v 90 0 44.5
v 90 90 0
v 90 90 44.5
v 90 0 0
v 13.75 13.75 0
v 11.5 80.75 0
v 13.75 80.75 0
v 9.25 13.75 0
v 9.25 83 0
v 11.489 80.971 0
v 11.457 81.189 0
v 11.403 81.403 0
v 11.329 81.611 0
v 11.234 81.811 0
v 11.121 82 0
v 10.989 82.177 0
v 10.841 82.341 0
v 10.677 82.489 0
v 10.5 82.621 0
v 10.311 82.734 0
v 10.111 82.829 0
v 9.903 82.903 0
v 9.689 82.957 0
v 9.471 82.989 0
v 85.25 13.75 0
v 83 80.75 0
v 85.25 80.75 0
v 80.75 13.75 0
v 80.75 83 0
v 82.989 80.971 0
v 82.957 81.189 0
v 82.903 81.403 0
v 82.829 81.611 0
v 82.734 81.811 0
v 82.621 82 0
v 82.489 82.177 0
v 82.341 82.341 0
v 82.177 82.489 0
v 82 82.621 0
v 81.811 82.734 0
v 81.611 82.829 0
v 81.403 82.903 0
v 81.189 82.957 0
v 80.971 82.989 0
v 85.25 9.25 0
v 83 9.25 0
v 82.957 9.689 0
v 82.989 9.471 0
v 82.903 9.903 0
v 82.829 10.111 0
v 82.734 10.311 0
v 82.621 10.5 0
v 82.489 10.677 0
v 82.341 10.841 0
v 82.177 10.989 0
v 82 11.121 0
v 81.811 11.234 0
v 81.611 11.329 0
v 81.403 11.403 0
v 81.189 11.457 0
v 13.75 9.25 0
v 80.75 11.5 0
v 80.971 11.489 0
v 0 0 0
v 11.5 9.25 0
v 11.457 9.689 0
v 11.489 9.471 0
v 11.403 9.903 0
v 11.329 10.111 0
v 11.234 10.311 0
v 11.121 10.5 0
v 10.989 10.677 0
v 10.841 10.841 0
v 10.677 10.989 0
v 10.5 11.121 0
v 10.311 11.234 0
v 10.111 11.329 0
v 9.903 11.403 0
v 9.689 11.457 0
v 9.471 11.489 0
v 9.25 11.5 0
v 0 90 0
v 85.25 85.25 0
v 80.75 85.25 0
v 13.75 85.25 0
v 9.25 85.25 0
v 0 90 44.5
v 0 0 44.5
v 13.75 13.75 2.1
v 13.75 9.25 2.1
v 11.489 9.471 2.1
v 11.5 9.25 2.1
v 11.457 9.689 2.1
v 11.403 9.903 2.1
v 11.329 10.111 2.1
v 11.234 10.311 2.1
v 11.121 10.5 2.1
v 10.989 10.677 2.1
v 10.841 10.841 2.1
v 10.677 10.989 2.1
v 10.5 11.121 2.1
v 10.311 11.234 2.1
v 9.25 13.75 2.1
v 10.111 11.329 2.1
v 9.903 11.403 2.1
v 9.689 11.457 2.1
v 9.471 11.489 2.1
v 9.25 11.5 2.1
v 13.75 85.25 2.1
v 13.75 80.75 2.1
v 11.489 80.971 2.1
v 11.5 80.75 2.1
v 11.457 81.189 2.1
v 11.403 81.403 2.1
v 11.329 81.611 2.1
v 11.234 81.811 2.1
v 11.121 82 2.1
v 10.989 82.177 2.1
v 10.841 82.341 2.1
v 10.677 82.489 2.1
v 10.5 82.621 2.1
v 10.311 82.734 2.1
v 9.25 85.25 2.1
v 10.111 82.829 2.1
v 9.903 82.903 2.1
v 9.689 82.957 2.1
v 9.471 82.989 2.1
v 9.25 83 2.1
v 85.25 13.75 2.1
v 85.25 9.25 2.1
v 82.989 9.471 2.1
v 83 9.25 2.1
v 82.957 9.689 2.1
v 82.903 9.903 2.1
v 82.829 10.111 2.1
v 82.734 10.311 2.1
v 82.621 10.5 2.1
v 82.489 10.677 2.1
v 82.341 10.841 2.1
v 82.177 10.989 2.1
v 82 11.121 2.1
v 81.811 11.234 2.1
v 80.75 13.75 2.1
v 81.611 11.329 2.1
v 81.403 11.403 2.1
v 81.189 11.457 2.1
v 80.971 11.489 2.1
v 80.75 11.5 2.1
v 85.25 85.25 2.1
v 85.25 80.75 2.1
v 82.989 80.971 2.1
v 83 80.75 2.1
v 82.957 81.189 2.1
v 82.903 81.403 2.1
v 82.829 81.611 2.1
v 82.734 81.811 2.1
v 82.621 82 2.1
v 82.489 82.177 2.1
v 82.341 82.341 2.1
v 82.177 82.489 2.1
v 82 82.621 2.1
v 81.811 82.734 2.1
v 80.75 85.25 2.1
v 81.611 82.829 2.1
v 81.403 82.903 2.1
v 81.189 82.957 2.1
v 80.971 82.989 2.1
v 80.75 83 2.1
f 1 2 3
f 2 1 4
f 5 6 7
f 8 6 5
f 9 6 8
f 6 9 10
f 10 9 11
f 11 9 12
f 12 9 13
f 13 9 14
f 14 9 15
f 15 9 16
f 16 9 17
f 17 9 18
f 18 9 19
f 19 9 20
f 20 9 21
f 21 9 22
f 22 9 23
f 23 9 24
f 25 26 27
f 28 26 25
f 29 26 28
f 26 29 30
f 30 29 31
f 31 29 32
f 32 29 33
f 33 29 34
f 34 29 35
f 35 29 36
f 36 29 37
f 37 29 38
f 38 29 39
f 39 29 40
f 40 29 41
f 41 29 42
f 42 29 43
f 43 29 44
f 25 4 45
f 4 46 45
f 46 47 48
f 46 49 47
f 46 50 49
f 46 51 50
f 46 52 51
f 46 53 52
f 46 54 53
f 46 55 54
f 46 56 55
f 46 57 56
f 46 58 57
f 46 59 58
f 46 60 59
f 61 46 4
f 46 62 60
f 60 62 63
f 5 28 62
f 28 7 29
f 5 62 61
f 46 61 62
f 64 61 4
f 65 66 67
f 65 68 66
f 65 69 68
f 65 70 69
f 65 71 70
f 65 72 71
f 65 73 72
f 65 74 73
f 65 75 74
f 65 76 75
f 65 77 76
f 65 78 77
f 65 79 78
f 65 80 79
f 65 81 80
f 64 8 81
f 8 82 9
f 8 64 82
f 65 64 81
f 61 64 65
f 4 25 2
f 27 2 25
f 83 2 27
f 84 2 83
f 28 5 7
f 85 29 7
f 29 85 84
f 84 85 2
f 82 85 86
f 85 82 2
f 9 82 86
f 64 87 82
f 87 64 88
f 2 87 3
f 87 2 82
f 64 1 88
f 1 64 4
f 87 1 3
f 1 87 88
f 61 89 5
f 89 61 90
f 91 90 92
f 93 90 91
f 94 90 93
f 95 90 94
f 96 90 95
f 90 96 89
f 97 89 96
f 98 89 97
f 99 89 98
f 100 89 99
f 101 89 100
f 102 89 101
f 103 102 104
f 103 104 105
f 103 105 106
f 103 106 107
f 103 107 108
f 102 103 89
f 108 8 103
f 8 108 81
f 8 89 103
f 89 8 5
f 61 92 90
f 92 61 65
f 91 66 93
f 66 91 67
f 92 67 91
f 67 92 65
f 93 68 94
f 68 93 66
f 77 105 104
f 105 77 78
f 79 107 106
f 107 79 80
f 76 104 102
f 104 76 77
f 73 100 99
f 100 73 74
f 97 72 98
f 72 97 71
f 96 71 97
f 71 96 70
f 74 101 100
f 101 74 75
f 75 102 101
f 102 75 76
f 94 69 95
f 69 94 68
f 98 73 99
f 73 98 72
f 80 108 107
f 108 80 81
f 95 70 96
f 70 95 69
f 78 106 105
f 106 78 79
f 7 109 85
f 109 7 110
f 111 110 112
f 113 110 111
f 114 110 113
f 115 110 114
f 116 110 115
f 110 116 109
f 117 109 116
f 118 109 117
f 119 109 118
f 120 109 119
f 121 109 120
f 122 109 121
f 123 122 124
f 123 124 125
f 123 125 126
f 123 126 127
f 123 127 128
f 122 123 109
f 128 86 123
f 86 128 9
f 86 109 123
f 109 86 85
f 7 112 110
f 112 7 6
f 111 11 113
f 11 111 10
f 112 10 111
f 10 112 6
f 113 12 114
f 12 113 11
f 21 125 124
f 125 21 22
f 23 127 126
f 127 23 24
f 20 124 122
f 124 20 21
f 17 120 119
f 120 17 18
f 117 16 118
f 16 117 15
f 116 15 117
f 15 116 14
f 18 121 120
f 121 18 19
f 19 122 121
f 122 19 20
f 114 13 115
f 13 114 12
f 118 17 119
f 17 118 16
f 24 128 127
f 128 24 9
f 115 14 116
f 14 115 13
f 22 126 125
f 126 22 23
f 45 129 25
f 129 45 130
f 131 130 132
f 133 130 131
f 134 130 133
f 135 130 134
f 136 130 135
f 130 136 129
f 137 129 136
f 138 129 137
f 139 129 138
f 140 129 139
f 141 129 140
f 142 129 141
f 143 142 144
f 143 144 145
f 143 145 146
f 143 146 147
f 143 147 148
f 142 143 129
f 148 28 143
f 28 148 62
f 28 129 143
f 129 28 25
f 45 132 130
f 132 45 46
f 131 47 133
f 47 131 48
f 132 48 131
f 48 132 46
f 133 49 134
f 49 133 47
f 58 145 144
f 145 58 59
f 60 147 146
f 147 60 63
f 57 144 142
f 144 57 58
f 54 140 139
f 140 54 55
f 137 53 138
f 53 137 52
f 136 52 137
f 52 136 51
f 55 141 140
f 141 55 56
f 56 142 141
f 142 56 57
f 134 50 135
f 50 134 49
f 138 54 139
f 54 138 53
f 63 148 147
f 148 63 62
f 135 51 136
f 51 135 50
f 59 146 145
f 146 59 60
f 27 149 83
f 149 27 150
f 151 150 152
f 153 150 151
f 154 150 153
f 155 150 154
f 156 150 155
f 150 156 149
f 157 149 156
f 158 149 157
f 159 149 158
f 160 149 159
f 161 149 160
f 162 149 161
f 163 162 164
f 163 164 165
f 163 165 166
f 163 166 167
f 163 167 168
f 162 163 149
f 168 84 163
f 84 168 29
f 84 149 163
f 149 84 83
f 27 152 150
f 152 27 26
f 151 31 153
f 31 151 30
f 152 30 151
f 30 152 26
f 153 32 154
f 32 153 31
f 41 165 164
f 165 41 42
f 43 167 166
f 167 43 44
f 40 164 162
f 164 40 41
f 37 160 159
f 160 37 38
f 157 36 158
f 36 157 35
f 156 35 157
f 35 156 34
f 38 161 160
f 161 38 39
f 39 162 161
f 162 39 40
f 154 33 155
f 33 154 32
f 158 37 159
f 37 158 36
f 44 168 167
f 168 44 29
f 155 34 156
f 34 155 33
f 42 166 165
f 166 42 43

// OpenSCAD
// DIY Magnetic Stirrer Housing
// Based on an 80mm PC case fan
// Print orientation: Upside down (Top plate on bed, walls rising up)

// --- Dimensions ---
// Outer dimensions of the box
W = 90;      // Width (X)
D = 90;      // Depth (Y)
H = 40;      // Height of walls (Z)

// Wall thickness
T_WALL = 2.5;

// Top plate thickness
T_TOP = 2;

// Fan mounting hole pattern
PATTERN_SIZE = 71.5; // Distance between opposite holes
HOLE_SIZE = 4.5;      // Diameter of M4 screw holes

// Cable notch dimensions
NOTCH_WIDTH = 12;
NOTCH_DEPTH = 8;      // Depth from the open top edge (Z = H)

// --- Configuration ---
$fn = 64; // Smooth curves

// --- Helper Functions ---
// Create a rectangular hole through a solid
module hole(x, y, z, dx, dy, dz, d) {
    difference() {
        translate([x, y, z]) cube([dx, dy, dz]);
        translate([x, y, z]) cylinder(h=d, r=d/2);
    }
}

// Create a rectangular notch on a face
module notch(x, y, z, dx, dy, dz, d) {
    difference() {
        translate([x, y, z]) cube([dx, dy, dz]);
        translate([x, y, z]) cube([dx, dy, NOTCH_DEPTH]);
    }
}

// --- Main Body Construction ---
// We build the solid from the bottom up.
// The base is the top plate (z=0 to z=2).
// The walls rise from z=2 to z=42 (2mm extra to ensure clean cut in difference).

difference() {
    union() {
        // 1. The Top Plate (Base)
        // Outer size W x D, thickness T_TOP
        translate([0, 0, 0]) 
            cube([W, D, T_TOP]);

        // 2. The Walls
        // Rise from z = T_TOP to z = H + T_WALL
        // Outer dimensions W x D
        translate([0, 0, T_TOP]) 
            cube([W, D, H + T_WALL]);
    }

    // --- Cutouts ---

    // 1. Screw Holes in the Top Plate
    // Pattern: 71.5mm square centered on the plate.
    // Plate is 90x90. Center is (45, 45).
    // Pattern center is (45, 45).
    // Hole positions: +/- 35.75 from center.
    // Coordinates: 9.25, 80.75
    
    for (i = [-1, 1]) {
        for (j = [-1, 1]) {
            // Calculate position
            px = 45 + (PATTERN_SIZE / 2) * i;
            py = 45 + (PATTERN_SIZE / 2) * j;
            
            // Cut hole through the top plate only (z=0 to z=2)
            // Extend slightly past the plate to ensure clean cut
            hole(px, py, 0, HOLE_SIZE, HOLE_SIZE, T_TOP + 0.1, HOLE_SIZE);
        }
    }

    // 2. Cable Notch in One Wall
    // Location: One of the walls. Let's choose the front wall (Y = D/2).
    // The wall is at Y = 45 (center) to Y = 90 (edge)? No, the box is 90x90.
    // Walls are at X=0..90, Y=0..90.
    // Let's pick the wall at Y = 0 (Front) or Y = 90 (Back).
    // Let's use the wall at Y = 0 (Front face looking from +Y).
    // Actually, standard orientation: X is width, Y is depth.
    // Let's cut the notch in the wall at Y = 0 (the "front" wall if looking from +Y).
    // Wait, if the box is 90x90, the walls are at X=0, X=90, Y=0, Y=90.
    // Let's cut the notch in the wall at Y = 0.
    // The notch is 12mm wide, centered along the wall.
    // Wall length is 90mm. Center is 45mm.
    // Notch X range: 45 - 6 = 39 to 45 + 6 = 51.
    // Notch Z range: From open edge (Z=40) down 8mm -> Z=32 to Z=40.
    // Notch Y range: Thickness of wall (2.5mm). Centered at Y=0? 
    // The wall exists from Y=-1.25 to Y=1.25? No, the solid is 0 to 90.
    // The wall at Y=0 is the face at Y=0. The material is from Y=0 to Y=2.5.
    // So the notch should be in the material Y=0 to Y=2.5.
    // Center Y = 1.25.
    
    // Notch Position
    nx = 45;
    ny = 1.25; // Center of the wall thickness at Y=0
    nz = 32;   // Start of the cut (8mm down from Z=40)
    
    // Dimensions
    ndx = NOTCH_WIDTH;
    ndy = T_WALL;
    ndz = NOTCH_DEPTH;
    
    // Cut the notch
    // We cut a block that removes the material from Z=32 to Z=40
    notch(nx, ny, nz, ndx, ndy, ndz, ndz);
    
    // Also need to cut the "back" of the notch if we consider the wall thickness properly
    // The notch goes through the wall thickness.
    // The wall is at Y=0 to Y=2.5.
    // The notch is centered at Y=1.25.
    // The cut shape is a cube of size [12, 2.5, 8].
    // This removes the material correctly.
}
